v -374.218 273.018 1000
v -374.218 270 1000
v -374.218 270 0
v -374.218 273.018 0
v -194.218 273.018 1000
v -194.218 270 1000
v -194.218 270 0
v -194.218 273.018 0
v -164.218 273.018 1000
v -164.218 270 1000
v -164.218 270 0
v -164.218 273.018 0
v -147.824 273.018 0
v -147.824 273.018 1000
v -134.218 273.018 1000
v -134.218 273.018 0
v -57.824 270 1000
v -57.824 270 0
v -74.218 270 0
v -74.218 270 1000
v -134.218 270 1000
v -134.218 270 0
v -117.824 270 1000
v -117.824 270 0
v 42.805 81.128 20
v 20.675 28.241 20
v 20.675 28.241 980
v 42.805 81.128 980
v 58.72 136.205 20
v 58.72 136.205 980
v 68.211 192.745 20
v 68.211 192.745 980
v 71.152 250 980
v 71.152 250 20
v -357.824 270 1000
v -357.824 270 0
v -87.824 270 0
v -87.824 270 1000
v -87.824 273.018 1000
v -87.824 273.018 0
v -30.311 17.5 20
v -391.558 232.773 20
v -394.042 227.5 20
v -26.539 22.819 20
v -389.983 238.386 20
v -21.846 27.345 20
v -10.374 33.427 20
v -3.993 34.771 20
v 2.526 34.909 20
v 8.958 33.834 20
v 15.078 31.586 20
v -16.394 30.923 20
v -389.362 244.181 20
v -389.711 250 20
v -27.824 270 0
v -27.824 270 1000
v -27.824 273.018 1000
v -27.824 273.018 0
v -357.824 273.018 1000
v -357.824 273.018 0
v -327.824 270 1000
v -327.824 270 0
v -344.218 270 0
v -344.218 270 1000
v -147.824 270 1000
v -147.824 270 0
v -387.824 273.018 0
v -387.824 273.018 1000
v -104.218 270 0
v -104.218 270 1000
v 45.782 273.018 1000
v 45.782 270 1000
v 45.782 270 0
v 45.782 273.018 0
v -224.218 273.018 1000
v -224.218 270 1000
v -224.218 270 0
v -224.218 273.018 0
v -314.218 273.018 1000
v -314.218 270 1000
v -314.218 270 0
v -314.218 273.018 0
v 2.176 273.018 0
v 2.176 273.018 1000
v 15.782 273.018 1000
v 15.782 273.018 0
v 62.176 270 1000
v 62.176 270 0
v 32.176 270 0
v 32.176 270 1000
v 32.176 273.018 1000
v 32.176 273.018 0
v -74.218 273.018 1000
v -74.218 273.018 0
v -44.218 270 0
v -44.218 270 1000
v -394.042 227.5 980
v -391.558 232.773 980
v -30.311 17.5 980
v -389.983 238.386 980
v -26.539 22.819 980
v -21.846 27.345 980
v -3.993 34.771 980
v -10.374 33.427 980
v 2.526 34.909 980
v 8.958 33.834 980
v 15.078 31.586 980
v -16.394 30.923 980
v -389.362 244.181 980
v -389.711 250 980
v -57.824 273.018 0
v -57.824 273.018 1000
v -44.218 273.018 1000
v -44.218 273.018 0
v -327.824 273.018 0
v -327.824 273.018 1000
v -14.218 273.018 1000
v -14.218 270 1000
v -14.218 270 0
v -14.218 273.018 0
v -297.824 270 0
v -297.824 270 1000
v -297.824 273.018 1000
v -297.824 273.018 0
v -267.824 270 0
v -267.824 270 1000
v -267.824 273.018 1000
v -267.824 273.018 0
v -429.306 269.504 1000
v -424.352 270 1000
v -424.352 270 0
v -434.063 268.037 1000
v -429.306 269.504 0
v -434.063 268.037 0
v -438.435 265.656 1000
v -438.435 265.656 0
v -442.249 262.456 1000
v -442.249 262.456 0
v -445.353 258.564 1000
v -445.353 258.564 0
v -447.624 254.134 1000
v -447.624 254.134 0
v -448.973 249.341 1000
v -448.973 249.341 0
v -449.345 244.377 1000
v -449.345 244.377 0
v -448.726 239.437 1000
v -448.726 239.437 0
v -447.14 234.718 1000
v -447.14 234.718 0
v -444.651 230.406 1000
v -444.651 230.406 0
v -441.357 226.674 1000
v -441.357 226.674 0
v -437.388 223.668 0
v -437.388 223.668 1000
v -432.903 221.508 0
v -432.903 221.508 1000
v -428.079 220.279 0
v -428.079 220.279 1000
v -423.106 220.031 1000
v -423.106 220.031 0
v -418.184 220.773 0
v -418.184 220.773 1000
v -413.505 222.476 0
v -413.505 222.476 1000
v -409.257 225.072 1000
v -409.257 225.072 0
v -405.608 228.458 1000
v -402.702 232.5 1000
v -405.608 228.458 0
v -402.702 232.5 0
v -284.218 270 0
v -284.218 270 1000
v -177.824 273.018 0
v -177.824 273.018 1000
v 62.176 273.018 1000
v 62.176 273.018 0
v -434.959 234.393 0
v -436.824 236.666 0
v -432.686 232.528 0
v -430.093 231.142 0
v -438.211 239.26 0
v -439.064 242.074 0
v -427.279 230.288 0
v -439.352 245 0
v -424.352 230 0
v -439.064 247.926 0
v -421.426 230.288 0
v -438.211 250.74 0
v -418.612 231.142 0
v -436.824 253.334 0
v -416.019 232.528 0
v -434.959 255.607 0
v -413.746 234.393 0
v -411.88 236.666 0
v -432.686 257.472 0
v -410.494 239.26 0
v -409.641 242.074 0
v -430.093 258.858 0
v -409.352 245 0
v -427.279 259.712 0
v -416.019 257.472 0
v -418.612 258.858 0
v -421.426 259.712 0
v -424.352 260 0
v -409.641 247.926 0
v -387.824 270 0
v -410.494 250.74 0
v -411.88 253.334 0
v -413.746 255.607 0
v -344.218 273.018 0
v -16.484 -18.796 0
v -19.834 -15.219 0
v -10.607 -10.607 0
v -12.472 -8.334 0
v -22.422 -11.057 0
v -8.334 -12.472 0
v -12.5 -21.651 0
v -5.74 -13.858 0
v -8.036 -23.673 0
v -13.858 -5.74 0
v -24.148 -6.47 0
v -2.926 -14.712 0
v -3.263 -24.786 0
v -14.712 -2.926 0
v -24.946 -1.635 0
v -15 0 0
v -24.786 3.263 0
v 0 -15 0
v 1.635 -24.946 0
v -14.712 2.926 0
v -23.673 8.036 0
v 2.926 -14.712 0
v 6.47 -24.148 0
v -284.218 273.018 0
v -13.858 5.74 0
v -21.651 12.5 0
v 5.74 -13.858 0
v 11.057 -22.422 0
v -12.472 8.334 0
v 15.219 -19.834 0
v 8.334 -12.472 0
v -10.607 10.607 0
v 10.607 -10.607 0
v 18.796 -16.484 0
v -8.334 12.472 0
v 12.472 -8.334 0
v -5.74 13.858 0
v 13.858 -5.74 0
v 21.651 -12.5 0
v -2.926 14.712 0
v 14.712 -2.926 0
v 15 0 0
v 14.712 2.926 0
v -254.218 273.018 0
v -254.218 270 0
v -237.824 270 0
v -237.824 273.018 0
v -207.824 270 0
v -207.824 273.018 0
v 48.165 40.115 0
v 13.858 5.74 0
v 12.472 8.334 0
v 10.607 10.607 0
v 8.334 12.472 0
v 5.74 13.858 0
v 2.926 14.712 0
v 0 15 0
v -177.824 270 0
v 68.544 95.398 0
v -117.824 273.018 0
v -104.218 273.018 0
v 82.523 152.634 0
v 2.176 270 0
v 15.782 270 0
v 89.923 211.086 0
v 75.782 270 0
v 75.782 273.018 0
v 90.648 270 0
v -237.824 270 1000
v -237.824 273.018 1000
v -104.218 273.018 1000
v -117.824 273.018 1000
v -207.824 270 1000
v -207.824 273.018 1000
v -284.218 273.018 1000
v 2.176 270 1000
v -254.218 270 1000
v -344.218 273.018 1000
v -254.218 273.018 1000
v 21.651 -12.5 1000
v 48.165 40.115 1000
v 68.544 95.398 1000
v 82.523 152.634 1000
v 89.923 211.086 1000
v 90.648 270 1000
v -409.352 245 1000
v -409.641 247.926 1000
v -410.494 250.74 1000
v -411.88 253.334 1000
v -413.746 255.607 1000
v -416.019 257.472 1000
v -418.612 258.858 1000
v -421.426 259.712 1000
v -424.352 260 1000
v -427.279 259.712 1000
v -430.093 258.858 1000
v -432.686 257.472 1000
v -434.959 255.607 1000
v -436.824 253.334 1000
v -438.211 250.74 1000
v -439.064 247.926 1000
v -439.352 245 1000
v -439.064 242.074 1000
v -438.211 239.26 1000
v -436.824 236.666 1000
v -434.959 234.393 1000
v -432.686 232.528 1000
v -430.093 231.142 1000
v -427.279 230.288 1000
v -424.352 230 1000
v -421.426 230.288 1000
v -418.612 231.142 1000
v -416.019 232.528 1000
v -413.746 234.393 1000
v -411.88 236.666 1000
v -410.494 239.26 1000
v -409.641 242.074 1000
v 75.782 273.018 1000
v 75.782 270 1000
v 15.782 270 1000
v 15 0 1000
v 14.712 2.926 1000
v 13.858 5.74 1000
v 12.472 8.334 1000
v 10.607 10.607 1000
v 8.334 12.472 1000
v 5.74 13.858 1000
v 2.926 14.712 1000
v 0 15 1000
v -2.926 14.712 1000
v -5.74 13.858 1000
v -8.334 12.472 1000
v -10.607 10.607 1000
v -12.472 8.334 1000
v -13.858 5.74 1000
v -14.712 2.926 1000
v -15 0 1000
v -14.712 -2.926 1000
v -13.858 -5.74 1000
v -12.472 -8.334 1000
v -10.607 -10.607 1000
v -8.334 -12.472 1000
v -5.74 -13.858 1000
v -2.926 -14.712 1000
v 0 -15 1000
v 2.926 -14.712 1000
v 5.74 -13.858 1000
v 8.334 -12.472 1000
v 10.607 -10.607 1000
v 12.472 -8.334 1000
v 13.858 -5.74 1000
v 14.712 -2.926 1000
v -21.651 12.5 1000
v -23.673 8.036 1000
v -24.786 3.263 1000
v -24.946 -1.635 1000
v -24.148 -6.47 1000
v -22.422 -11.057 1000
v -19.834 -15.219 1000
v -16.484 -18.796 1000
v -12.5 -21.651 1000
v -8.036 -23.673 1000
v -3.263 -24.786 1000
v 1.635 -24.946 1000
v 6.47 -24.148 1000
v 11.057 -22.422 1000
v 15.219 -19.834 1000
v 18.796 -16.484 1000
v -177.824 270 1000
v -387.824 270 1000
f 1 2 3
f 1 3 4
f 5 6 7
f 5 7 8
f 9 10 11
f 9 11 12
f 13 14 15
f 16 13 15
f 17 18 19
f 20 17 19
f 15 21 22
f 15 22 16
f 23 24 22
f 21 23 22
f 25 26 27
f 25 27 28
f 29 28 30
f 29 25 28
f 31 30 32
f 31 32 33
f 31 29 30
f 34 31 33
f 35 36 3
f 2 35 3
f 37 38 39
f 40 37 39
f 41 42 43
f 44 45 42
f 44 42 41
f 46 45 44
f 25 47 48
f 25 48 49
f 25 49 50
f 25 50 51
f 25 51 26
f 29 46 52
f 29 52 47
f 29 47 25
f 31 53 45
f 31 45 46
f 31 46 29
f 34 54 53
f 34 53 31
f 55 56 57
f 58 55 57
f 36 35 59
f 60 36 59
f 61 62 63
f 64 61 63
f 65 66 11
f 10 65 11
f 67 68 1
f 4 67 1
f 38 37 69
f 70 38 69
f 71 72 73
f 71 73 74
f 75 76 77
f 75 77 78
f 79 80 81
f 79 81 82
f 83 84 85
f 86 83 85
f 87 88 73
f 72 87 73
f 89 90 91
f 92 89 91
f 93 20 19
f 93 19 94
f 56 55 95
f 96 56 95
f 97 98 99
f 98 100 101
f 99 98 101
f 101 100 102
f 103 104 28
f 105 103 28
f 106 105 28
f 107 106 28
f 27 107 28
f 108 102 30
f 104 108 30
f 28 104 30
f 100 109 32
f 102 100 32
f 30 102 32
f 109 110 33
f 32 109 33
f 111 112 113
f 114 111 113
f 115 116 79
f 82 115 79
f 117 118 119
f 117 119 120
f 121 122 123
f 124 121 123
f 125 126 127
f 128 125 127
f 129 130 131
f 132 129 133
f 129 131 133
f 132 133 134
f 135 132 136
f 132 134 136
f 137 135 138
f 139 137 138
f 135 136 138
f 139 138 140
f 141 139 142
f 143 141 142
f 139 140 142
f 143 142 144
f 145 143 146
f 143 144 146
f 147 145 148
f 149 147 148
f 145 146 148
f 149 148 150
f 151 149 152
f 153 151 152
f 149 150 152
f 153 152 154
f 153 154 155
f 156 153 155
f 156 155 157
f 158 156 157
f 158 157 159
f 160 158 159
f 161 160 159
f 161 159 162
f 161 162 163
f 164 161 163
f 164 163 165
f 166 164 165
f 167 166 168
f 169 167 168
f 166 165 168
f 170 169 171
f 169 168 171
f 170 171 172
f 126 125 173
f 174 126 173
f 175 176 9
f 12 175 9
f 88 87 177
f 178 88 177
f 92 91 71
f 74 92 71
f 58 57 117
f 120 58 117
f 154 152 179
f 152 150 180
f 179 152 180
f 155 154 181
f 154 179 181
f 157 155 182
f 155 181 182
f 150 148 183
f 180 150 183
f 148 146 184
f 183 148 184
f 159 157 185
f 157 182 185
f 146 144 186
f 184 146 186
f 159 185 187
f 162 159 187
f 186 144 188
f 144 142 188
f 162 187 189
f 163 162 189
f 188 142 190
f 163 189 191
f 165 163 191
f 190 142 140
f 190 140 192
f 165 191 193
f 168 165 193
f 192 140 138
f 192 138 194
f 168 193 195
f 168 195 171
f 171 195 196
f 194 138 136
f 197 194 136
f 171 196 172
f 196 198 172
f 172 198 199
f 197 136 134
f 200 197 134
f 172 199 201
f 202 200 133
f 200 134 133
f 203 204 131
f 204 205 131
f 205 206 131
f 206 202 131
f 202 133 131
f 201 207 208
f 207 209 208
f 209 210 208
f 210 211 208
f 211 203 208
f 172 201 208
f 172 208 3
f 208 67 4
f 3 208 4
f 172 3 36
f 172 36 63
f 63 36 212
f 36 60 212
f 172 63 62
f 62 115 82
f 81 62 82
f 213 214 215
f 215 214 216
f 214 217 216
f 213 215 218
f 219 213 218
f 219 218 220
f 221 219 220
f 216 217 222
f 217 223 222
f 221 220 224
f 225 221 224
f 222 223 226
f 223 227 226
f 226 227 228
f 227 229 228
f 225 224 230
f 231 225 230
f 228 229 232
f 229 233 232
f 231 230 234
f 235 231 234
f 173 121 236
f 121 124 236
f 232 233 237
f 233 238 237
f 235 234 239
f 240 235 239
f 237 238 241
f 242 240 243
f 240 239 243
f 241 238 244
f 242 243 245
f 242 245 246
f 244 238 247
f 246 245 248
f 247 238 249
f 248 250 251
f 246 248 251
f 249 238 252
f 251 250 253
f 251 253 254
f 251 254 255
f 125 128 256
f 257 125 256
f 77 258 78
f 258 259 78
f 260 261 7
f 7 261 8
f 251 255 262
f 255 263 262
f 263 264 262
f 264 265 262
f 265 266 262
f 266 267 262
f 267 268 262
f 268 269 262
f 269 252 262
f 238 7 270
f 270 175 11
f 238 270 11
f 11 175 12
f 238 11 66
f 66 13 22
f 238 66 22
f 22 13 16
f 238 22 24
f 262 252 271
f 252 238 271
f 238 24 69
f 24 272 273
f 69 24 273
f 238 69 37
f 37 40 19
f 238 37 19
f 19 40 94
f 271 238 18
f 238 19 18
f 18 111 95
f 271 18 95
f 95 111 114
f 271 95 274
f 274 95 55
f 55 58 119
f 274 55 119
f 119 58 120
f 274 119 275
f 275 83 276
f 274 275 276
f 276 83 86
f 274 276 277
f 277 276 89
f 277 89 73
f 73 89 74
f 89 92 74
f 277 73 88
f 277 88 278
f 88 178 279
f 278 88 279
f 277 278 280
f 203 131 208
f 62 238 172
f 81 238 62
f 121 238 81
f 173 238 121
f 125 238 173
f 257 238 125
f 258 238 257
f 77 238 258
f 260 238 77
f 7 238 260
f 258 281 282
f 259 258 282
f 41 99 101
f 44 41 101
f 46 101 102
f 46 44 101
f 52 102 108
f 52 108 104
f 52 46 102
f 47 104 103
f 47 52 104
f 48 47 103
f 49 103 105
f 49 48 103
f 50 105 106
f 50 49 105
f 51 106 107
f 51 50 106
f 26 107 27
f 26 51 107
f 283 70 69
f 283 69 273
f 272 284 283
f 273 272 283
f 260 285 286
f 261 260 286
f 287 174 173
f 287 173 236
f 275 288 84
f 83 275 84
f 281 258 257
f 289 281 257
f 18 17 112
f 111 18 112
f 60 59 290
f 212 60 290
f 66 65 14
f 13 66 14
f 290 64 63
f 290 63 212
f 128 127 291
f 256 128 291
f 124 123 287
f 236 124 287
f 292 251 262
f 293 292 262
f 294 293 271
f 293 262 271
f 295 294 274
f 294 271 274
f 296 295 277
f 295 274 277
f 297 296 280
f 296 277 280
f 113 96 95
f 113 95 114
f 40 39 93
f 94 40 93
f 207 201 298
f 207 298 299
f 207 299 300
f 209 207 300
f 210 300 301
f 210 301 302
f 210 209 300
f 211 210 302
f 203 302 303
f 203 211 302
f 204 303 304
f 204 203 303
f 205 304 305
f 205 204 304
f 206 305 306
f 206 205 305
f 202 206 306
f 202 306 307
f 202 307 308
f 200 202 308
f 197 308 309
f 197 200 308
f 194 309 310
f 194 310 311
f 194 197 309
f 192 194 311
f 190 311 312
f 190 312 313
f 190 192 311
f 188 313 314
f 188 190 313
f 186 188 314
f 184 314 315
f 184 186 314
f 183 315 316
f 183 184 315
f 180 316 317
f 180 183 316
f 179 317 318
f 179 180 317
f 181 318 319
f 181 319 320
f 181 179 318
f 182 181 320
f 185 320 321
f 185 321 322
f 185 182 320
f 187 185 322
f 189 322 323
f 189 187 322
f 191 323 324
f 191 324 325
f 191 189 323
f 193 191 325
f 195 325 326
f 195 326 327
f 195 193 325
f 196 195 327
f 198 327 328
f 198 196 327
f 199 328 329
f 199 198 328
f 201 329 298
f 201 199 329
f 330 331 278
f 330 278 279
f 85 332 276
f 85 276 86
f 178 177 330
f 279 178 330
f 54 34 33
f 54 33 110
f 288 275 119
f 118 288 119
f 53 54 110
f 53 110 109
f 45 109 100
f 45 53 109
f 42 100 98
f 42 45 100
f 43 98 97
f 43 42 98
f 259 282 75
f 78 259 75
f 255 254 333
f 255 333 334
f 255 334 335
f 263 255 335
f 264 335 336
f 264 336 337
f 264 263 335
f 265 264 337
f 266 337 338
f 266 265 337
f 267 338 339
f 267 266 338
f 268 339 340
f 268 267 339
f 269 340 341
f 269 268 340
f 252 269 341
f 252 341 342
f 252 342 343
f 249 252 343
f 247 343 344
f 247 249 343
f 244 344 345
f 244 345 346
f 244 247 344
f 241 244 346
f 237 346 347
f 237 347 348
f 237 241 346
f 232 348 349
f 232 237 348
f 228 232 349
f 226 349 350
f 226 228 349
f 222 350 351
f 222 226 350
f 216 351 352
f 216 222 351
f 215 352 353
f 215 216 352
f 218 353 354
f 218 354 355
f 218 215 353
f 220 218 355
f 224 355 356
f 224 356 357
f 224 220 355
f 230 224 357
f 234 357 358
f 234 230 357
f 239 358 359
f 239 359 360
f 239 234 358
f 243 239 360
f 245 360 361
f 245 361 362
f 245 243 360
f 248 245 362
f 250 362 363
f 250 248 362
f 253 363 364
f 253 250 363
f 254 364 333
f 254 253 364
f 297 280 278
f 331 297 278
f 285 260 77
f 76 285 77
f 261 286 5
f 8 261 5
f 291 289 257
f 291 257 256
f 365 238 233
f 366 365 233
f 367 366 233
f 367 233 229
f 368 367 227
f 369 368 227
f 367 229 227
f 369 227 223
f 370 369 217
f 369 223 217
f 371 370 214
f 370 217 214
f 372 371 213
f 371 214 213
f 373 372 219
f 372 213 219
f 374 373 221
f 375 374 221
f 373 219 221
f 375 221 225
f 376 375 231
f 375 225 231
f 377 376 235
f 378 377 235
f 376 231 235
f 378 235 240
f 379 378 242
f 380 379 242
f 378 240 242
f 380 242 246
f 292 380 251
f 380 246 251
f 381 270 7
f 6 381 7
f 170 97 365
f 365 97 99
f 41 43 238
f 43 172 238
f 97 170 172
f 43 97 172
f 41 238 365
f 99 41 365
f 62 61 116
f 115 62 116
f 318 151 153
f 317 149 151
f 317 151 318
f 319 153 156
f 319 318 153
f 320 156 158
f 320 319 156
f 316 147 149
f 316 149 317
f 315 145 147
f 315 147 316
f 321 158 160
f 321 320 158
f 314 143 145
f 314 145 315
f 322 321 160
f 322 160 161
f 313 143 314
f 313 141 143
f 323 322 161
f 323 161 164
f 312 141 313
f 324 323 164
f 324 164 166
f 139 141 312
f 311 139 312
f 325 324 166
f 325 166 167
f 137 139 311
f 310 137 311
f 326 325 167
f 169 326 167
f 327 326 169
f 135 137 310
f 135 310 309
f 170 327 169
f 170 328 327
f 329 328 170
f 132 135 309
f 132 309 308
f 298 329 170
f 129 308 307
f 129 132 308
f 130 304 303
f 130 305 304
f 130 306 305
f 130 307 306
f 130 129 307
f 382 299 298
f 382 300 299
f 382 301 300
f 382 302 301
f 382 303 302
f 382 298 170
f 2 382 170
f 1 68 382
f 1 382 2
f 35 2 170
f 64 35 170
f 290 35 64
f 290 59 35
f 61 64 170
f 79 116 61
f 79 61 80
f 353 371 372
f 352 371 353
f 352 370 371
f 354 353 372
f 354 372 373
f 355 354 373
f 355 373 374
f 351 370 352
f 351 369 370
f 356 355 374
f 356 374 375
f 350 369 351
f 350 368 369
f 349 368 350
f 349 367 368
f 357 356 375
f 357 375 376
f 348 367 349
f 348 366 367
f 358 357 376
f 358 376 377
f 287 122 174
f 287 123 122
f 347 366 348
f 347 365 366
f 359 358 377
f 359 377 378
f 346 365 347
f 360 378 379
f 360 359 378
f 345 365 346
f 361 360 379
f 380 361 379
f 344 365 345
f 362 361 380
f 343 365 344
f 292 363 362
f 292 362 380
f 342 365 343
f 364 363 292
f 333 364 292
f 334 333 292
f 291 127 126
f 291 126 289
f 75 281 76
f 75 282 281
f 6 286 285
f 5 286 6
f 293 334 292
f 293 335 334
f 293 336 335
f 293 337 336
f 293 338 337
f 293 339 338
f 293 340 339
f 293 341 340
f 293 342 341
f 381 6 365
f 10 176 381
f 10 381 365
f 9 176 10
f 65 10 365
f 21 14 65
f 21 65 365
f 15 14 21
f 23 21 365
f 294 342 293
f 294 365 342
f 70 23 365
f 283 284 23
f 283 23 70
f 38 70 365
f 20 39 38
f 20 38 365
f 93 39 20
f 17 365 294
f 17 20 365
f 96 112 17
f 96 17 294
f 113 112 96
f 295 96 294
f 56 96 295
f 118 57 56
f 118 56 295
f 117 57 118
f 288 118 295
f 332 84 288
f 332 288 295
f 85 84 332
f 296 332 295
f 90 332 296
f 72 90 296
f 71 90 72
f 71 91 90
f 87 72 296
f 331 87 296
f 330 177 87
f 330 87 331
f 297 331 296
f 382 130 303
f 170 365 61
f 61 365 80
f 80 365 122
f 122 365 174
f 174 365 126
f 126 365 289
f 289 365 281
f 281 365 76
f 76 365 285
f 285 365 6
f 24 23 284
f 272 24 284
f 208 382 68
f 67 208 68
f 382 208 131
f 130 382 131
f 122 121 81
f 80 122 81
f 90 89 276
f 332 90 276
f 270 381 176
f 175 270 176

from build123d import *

# Parameters (mm, degrees)
SKETCH1_R           = 15
BOSS_EXTRUDE1_DEPTH = 1000
SKETCH2_W           = 13.606398545
SKETCH2_H           = 3.01775833
BOSS_EXTRUDE2_DEPTH = 1000
SHELL1_START        = 20
SHELL1_DEPTH        = 960


# Read off the part's stored shape, not the designer's step: Shell1
with BuildPart() as part:
    # Sketch1 → Boss-Extrude1 (new body)
    with BuildSketch(Plane.XY):
        with BuildLine():
            Line((90.647552146, 270), (-424.352447854, 270))
            ThreePointArc((-424.352447854, 270), (-446.003082949, 232.5), (-402.70181276, 232.5))
            Line((-402.70181276, 232.5), (-21.650635095, 12.5))
            ThreePointArc((-21.650635095, 12.5), (-12.5, -21.650635095), (21.650635095, -12.5))
            ThreePointArc((21.650635095, -12.5), (76.346217655, 123.817117551), (90.647552146, 270))
        make_face()
        with Locations((-424.352447854, 245)):
            Circle(SKETCH1_R, mode=Mode.SUBTRACT)
        Circle(SKETCH1_R, mode=Mode.SUBTRACT)
    extrude(amount=BOSS_EXTRUDE1_DEPTH)

    # Sketch2 → Boss-Extrude2 (add)
    with BuildSketch(Plane.XY.offset(1000)):
        with Locations((-381.021044878, 271.508879165)):
            Rectangle(SKETCH2_W, SKETCH2_H)
        with Locations((-351.021044878, 271.508879165)):
            Rectangle(SKETCH2_W, SKETCH2_H)
        with Locations((-321.021044878, 271.508879165)):
            Rectangle(SKETCH2_W, SKETCH2_H)
        with Locations((-291.021044878, 271.508879165)):
            Rectangle(SKETCH2_W, SKETCH2_H)
        with Locations((-261.021044878, 271.508879165)):
            Rectangle(SKETCH2_W, SKETCH2_H)
        with Locations((-231.021044879, 271.508879165)):
            Rectangle(SKETCH2_W, SKETCH2_H)
        with Locations((-201.021044879, 271.508879165)):
            Rectangle(SKETCH2_W, SKETCH2_H)
        with Locations((-171.021044878, 271.508879165)):
            Rectangle(SKETCH2_W, SKETCH2_H)
        with Locations((-141.021044878, 271.508879165)):
            Rectangle(SKETCH2_W, SKETCH2_H)
        with Locations((-111.021044879, 271.508879165)):
            Rectangle(SKETCH2_W, SKETCH2_H)
        with Locations((-81.021044879, 271.508879165)):
            Rectangle(SKETCH2_W, SKETCH2_H)
        with Locations((-51.021044879, 271.508879165)):
            Rectangle(SKETCH2_W, SKETCH2_H)
        with Locations((-21.021044878, 271.508879165)):
            Rectangle(SKETCH2_W, SKETCH2_H)
        with Locations((8.978955122, 271.508879165)):
            Rectangle(SKETCH2_W, SKETCH2_H)
        with Locations((38.978955122, 271.508879165)):
            Rectangle(SKETCH2_W, SKETCH2_H)
        with Locations((68.978955122, 271.508879165)):
            Rectangle(SKETCH2_W, SKETCH2_H)
    extrude(amount=-BOSS_EXTRUDE2_DEPTH)

    # Shell1 outline → Shell1 (cut)
    with BuildSketch(Plane.XY.offset(SHELL1_START)):
        with BuildLine():
            ThreePointArc((20.675289686, 28.240616077), (58.720352341, 136.205240665), (71.151752213, 250))
            Line((71.151752213, 250), (-389.711431703, 250))
            ThreePointArc((-389.711431703, 250), (-389.983130142, 238.385621722), (-394.041558722, 227.5))
            Line((-394.041558722, 227.5), (-30.310889132, 17.5))
            ThreePointArc((-30.310889132, 17.5), (-7.214665799, 34.248337148), (20.675289686, 28.240616077))
        make_face()
    extrude(amount=SHELL1_DEPTH, mode=Mode.SUBTRACT)


solid = part.part
